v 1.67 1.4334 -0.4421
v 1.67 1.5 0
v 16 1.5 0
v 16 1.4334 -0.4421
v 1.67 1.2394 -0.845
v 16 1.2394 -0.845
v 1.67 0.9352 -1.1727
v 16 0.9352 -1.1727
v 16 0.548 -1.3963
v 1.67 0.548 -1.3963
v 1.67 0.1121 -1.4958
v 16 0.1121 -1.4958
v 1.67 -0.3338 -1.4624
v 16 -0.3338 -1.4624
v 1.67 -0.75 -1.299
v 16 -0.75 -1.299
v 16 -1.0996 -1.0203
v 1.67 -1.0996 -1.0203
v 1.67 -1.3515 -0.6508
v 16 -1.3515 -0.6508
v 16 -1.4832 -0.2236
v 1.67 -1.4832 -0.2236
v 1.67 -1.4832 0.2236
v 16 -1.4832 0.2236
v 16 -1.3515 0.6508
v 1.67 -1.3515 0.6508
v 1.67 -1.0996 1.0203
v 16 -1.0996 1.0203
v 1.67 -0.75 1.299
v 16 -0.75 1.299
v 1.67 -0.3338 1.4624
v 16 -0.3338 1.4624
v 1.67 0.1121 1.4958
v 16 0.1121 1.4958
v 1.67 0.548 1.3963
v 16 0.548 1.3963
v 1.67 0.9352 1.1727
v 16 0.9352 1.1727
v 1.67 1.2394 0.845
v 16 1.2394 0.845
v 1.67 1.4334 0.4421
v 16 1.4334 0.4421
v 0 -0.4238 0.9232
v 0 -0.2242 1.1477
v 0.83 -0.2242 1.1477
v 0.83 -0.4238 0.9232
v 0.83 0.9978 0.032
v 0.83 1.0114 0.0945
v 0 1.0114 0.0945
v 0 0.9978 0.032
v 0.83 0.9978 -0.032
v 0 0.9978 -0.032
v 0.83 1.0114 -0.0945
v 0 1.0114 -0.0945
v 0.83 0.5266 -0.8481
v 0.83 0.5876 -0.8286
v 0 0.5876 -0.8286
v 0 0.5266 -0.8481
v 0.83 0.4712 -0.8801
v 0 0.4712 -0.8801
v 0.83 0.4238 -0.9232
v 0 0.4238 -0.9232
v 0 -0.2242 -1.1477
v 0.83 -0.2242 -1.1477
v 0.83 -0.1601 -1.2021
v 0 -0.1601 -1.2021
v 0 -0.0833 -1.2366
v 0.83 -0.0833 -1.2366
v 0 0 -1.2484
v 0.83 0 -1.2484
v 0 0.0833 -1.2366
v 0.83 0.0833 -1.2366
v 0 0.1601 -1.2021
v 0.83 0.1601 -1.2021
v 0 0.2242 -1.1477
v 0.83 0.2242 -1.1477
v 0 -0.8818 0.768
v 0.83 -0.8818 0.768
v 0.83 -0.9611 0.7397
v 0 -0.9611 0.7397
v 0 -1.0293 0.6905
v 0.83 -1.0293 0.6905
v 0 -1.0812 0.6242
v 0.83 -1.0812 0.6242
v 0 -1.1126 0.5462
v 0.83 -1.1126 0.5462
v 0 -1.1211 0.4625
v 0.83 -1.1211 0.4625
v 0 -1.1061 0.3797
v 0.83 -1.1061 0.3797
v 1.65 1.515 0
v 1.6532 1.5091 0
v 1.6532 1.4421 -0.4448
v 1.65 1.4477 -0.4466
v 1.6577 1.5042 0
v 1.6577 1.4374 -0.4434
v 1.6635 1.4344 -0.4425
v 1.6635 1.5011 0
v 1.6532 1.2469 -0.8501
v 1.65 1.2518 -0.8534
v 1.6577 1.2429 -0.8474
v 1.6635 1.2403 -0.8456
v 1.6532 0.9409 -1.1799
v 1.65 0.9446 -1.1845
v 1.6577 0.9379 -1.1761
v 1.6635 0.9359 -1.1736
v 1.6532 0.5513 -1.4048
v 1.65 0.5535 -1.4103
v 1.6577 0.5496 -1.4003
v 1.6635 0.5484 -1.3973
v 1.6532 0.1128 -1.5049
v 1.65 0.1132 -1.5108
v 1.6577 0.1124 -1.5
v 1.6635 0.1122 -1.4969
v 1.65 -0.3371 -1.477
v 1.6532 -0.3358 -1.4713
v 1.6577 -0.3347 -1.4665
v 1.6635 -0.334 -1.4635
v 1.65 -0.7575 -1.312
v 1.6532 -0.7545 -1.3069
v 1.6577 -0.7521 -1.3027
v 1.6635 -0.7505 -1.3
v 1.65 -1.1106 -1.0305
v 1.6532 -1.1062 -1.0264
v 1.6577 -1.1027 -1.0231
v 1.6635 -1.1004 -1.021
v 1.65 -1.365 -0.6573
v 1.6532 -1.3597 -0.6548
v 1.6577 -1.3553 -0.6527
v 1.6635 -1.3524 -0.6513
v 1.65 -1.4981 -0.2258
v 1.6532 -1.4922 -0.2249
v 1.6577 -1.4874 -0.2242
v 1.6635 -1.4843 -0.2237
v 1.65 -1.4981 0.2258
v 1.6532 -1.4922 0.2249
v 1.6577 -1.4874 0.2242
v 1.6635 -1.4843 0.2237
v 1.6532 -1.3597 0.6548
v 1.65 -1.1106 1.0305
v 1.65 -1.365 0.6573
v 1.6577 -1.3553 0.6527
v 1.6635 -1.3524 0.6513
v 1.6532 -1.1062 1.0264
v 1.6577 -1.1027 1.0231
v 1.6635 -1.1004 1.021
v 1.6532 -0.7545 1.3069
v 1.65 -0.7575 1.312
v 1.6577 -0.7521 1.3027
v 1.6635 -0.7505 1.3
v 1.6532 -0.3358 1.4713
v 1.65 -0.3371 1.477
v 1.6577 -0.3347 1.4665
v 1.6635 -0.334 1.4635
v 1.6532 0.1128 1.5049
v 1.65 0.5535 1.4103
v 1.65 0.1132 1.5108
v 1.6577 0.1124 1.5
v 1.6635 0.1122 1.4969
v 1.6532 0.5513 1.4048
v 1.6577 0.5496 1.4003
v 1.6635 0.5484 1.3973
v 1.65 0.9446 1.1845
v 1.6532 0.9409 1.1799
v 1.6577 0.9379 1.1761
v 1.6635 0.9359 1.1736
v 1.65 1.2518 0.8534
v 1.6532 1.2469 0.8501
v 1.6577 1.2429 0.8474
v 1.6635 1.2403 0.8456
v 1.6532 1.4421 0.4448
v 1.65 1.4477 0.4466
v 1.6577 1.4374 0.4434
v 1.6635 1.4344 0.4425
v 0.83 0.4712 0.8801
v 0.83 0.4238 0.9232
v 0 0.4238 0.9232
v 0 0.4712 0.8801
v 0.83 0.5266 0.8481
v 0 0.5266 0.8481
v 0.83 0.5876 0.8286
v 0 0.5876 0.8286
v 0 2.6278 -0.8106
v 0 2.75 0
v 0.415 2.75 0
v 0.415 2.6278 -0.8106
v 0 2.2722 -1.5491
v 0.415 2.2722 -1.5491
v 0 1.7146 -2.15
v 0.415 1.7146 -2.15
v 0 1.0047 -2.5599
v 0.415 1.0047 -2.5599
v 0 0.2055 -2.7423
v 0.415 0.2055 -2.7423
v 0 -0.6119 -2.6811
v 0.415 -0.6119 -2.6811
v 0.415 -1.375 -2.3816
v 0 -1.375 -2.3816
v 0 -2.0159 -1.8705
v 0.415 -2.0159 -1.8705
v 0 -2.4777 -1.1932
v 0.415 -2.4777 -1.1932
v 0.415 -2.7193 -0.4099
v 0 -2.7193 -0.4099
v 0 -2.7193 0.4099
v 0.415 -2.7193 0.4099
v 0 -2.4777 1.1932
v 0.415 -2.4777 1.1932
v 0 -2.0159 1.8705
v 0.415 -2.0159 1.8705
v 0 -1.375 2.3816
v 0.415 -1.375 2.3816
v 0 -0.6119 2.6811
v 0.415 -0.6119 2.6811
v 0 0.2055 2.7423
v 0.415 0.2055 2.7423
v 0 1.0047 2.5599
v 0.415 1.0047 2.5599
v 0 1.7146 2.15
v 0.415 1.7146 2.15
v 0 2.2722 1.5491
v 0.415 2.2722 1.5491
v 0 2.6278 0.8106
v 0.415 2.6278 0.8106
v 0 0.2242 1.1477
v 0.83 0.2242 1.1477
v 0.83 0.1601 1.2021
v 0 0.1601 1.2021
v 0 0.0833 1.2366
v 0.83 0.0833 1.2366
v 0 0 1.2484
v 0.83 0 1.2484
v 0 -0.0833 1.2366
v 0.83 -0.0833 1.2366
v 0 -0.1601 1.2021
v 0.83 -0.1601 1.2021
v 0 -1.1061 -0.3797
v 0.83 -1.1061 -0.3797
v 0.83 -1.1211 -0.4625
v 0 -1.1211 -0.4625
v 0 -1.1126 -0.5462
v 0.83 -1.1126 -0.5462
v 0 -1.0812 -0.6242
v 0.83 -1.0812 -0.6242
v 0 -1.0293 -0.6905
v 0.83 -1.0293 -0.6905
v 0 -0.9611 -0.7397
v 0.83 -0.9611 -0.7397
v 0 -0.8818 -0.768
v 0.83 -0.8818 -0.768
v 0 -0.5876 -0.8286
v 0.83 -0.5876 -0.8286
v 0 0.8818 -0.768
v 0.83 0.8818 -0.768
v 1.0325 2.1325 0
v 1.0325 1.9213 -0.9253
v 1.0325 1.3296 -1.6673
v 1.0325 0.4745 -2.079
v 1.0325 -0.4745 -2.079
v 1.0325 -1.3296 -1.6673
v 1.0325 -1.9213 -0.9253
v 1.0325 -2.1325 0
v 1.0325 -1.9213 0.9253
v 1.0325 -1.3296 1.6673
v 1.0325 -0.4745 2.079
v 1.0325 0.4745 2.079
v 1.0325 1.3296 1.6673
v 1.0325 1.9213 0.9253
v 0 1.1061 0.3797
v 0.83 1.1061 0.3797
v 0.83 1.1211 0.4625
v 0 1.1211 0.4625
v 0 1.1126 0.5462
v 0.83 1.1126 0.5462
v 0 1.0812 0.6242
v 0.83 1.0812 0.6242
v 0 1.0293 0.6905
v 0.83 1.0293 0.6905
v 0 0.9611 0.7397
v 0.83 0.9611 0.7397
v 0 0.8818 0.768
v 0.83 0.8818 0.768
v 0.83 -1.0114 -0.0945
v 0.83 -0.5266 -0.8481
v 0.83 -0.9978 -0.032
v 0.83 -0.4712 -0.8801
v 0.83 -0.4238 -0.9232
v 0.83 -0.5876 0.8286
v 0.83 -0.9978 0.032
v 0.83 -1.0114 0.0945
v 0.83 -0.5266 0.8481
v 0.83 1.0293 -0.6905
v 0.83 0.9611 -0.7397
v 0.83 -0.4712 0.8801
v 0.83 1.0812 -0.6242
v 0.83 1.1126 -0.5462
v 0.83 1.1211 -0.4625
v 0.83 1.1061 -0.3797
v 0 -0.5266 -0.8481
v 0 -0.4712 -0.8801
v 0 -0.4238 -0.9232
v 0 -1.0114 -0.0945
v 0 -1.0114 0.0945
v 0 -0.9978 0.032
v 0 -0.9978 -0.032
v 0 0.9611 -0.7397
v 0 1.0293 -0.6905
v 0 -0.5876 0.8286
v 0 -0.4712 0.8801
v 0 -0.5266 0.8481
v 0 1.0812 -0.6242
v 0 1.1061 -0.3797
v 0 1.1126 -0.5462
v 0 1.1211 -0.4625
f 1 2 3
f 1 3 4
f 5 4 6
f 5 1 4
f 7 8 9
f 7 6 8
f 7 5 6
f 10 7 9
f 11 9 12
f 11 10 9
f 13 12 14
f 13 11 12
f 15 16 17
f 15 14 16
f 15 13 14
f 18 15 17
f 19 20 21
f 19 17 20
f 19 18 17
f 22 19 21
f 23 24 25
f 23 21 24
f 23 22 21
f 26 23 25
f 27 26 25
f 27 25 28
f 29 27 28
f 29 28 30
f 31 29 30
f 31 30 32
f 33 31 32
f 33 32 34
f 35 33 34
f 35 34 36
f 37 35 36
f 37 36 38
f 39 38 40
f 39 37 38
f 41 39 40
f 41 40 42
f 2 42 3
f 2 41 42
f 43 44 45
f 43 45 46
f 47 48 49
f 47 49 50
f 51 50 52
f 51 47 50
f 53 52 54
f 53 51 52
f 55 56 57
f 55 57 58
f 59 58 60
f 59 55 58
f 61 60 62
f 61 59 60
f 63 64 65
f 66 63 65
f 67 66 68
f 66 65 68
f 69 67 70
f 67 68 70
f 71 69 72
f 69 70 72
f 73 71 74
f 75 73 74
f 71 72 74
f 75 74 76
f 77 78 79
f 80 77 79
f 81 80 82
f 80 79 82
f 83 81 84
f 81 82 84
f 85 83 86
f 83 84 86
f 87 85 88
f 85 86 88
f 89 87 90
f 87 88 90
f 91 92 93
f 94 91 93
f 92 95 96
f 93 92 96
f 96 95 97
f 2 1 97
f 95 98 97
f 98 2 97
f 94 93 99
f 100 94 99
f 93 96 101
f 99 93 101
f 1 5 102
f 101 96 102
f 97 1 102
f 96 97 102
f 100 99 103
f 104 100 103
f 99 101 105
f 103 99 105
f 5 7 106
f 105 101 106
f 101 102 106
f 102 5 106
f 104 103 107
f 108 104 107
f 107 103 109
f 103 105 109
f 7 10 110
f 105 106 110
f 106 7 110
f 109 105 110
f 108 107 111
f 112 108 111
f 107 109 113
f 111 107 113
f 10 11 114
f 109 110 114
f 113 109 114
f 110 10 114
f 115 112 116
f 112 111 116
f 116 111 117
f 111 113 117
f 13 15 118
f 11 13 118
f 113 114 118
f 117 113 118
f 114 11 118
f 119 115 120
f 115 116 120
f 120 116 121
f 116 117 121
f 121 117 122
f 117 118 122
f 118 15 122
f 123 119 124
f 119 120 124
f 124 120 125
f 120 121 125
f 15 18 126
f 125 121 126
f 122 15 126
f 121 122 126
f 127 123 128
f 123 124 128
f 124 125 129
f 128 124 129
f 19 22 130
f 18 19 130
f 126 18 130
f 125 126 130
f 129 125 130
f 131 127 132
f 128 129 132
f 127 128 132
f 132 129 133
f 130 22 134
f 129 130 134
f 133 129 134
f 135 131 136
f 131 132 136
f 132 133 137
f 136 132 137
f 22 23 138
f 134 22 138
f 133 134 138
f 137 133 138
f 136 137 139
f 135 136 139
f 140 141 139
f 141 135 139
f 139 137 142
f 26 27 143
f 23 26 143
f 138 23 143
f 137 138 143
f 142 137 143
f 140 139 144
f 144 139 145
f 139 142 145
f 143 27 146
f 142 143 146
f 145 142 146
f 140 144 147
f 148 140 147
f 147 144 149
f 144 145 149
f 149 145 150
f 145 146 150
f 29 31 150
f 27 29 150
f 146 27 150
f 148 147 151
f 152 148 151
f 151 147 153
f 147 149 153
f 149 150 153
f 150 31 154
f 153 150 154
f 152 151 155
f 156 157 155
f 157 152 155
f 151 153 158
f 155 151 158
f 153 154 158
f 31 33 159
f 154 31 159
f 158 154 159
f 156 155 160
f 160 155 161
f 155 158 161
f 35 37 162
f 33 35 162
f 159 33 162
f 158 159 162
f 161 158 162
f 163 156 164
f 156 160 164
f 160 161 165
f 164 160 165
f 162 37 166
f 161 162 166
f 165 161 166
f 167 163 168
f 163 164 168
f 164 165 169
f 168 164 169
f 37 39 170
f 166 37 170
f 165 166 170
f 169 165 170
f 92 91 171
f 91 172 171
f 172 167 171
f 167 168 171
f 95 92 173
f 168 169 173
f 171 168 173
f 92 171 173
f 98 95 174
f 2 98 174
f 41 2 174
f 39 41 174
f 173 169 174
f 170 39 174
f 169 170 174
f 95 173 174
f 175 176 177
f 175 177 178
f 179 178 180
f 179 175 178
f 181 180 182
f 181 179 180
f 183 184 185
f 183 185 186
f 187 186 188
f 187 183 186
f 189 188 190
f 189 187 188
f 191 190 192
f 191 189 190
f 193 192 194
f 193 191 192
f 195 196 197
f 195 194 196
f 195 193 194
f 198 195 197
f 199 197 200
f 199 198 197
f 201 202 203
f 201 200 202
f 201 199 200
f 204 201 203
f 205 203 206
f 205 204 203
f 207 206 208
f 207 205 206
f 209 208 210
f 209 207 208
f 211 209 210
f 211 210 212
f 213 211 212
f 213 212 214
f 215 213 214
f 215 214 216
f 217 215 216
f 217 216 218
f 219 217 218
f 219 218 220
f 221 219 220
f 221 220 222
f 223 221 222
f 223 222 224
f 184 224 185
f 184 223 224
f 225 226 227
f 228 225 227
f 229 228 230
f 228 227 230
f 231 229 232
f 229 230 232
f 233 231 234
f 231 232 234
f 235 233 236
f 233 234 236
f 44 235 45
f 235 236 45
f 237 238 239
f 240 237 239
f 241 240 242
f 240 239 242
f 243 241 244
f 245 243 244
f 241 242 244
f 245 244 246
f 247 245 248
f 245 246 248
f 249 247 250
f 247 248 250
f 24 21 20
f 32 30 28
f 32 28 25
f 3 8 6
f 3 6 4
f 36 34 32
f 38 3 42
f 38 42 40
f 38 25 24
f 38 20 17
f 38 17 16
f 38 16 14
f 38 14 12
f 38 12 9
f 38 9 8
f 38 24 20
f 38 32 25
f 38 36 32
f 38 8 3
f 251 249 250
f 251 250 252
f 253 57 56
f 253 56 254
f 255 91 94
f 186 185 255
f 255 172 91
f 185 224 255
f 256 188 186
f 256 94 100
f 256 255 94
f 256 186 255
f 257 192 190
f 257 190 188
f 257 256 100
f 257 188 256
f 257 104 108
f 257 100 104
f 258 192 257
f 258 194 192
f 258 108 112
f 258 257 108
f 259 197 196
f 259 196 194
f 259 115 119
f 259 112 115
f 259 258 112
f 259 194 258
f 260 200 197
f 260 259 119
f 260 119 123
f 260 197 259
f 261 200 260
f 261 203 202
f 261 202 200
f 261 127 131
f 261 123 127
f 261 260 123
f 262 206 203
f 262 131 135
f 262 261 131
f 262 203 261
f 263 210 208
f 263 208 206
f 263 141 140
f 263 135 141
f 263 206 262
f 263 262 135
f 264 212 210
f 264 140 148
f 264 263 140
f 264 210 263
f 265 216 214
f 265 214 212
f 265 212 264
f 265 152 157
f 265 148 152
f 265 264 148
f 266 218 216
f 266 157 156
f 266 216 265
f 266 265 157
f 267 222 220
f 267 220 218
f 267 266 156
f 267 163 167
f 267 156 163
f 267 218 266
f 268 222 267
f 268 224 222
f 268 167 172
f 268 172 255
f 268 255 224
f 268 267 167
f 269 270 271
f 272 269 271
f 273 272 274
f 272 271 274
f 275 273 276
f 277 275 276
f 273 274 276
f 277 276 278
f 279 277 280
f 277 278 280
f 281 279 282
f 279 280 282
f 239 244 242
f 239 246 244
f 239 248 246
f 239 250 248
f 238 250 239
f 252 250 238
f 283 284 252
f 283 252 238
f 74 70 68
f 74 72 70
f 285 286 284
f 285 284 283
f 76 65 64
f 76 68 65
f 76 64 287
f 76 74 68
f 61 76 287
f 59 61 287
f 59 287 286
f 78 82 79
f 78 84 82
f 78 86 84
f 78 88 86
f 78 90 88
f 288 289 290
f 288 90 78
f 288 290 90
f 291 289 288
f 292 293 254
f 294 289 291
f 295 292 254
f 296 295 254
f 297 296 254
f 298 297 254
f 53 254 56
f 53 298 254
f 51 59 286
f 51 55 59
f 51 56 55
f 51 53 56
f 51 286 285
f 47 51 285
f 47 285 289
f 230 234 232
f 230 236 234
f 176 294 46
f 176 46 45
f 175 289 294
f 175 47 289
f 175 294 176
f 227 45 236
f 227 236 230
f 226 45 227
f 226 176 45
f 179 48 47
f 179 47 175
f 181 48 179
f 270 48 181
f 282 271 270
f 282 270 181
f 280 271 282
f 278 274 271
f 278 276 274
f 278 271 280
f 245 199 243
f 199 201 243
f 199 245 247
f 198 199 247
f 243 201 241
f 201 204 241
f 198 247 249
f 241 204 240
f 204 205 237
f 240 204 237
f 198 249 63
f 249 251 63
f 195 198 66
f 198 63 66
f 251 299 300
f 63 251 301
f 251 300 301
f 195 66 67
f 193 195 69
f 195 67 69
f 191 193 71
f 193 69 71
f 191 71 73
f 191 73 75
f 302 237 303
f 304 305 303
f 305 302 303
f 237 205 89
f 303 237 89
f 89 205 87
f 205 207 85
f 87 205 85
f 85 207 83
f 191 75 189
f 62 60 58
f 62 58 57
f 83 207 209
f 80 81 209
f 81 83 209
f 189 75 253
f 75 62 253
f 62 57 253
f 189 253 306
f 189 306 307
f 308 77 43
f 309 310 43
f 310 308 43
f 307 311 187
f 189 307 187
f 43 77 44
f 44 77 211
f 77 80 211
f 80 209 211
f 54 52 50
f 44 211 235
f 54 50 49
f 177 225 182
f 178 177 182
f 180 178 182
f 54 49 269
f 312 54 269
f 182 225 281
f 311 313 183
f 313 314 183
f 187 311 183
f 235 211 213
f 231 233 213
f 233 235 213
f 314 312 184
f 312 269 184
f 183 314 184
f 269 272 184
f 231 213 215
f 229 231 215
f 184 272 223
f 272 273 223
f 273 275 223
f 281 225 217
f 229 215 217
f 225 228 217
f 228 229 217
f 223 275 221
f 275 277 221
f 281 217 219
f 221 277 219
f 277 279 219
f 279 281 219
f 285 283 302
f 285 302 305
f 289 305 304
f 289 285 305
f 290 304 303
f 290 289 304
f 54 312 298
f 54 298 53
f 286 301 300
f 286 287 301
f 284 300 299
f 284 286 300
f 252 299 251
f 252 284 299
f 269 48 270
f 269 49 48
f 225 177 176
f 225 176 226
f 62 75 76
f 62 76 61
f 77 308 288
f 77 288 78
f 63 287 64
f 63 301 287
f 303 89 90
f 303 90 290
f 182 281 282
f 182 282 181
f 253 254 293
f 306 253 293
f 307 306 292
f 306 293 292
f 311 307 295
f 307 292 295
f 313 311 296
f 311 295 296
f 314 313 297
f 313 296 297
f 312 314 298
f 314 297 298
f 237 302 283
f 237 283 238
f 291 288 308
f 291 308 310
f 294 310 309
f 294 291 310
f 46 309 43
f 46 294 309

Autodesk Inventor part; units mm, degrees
ref_plane "YZ Plane" through (0, 0, 0) normal (1, 0, 0) x (0, 1, 0)
ref_plane "XZ Plane" through (0, 0, 0) normal (0, 1, 0) x (-1, 0, 0)
ref_plane "XY Plane" through (0, 0, 0) normal (0, 0, 1) x (1, 0, 0)
sketch "Sketch1" plane through (0, 0, 0) normal (0, 0, 1) x (1, 0, 0)
  line L0 (0, 0) -> (16, 0)
  line L1 (16, 0) -> (16, 1.5)
  line L2 (16, 1.5) -> (2.35, 1.5)
  line L3 (2.35, 1.5) -> (2.15, 1.5)
  line L4 (2.15, 1.5) -> (1.67, 1.5)
  line L5 (1.65, 1.515) -> (1.65, 1.515)
  line L6 (1.65, 1.515) -> (0.415, 2.75)
  line L7 (0.415, 2.75) -> (0, 2.75)
  line L8 (0, 2.75) -> (0, 0)
  line L9 (1.65, 1.515) -> (1.65, 1.52)
  arc A0 (1.65, 1.52) -> (1.67, 1.5) centre (1.67, 1.52) ccw
  dimension "d17" = 16
  dimension "d18" = 0.415
  dimension "d19" = 1.65
  dimension "d20" = 0
  dimension "d21" = 5.5
  dimension "d22" = 3
  dimension "d23" = 3
  dimension "d25" = 45
  dimension "d26" = 0.2
  dimension "d28" = 0.02
  dimension "d29" = 13.65
  dimension "d30" = 0.02
  dimension "d52" = 0.7
revolve "Revolution1" add sketch "Sketch1" angle 360 about axis through (0, 0, 0) along (1, 0, 0)
thread "Thread1" size "M3x0.5" class "6g" standard "ISO Metric profile" length 13.65
sketch "Sketch2" plane through (0, 0, 0) normal (-1, 0, 0) x (0, 0, 1)
  circle A0 centre (0, 0) radius 1.4 construction
  circle A1 centre (0, 0) radius 0.98 construction
  line L0 (0, 0) -> (0.8487, 0.49)
  line L1 (0, 0) -> (0.98, 0) construction
  line L2 (0, 0) -> (0.8487, -0.49)
  line L3 (0, 0) -> (0.98, 0) construction
  line L4 (0.8487, 0.49) -> (1.4, 0)
  line L5 (1.4, 0) -> (0.8487, -0.49)
  dimension "d34" = 2.8
  dimension "d35" = 1.96
  dimension "d39" = 30
  dimension "d40" = 330
extrude "Extrusion1" cut sketch "Sketch2" against normal blind 0.83
pattern_circular "Circular Pattern1" count 6 over 360 about axis through (-10, 0, 0) along (1, 0, 0) of "Extrusion1"
fillet "Fillet1" radius 0.3 12 edges at (0.415, 0.49, 0.8487) (0.415, 0, 1.4) (0.415, -0.49, 0.8487) (0.415, -0.98, 0) (0.415, -1.2124, 0.7) (0.415, -1.2124, -0.7) (0.415, -0.49, -0.8487) (0.415, 0, -1.4) (0.415, 0.49, -0.8487) (0.415, 1.2124, -0.7) (0.415, 0.98, 0) (0.415, 1.2124, 0.7)
equation "\"d32\" = b"
equation "\"d34\" = A_"
equation "\"d35\" = 0.7 * A_"
equation "\"d43\" = t"
equation "\"d48\" = v"
equation "\"d17\" = l_"
equation "\"d18\" = 0.5 * t"
equation "\"d19\" = k"
equation "\"d21\" = dk"
equation "\"d22\" = d"
equation "\"d23\" = ds_"
equation "\"d25\" = 0.5 * headAngle"
equation "\"d26\" = x"
equation "\"d28\" = r"
equation "\"d29\" = b"
equation "\"b\" = 13.65"
equation "\"A_\" = 2.8"
equation "\"t\" = 0.83"
equation "\"v\" = 0.3"
equation "\"l_\" = 16"
equation "\"k\" = 1.65"
equation "\"dk\" = 5.5"
equation "\"d\" = 3"
equation "\"ds_\" = 3"
equation "\"headAngle\" = 90deg"
equation "\"x\" = 0.2"
equation "\"r\" = 0.02"
properties part number "Šroub se zápustnou hlavou a šestiramennou drážkou ISO 14581 - M3x16-4.8" material "Ocel, měkká"
